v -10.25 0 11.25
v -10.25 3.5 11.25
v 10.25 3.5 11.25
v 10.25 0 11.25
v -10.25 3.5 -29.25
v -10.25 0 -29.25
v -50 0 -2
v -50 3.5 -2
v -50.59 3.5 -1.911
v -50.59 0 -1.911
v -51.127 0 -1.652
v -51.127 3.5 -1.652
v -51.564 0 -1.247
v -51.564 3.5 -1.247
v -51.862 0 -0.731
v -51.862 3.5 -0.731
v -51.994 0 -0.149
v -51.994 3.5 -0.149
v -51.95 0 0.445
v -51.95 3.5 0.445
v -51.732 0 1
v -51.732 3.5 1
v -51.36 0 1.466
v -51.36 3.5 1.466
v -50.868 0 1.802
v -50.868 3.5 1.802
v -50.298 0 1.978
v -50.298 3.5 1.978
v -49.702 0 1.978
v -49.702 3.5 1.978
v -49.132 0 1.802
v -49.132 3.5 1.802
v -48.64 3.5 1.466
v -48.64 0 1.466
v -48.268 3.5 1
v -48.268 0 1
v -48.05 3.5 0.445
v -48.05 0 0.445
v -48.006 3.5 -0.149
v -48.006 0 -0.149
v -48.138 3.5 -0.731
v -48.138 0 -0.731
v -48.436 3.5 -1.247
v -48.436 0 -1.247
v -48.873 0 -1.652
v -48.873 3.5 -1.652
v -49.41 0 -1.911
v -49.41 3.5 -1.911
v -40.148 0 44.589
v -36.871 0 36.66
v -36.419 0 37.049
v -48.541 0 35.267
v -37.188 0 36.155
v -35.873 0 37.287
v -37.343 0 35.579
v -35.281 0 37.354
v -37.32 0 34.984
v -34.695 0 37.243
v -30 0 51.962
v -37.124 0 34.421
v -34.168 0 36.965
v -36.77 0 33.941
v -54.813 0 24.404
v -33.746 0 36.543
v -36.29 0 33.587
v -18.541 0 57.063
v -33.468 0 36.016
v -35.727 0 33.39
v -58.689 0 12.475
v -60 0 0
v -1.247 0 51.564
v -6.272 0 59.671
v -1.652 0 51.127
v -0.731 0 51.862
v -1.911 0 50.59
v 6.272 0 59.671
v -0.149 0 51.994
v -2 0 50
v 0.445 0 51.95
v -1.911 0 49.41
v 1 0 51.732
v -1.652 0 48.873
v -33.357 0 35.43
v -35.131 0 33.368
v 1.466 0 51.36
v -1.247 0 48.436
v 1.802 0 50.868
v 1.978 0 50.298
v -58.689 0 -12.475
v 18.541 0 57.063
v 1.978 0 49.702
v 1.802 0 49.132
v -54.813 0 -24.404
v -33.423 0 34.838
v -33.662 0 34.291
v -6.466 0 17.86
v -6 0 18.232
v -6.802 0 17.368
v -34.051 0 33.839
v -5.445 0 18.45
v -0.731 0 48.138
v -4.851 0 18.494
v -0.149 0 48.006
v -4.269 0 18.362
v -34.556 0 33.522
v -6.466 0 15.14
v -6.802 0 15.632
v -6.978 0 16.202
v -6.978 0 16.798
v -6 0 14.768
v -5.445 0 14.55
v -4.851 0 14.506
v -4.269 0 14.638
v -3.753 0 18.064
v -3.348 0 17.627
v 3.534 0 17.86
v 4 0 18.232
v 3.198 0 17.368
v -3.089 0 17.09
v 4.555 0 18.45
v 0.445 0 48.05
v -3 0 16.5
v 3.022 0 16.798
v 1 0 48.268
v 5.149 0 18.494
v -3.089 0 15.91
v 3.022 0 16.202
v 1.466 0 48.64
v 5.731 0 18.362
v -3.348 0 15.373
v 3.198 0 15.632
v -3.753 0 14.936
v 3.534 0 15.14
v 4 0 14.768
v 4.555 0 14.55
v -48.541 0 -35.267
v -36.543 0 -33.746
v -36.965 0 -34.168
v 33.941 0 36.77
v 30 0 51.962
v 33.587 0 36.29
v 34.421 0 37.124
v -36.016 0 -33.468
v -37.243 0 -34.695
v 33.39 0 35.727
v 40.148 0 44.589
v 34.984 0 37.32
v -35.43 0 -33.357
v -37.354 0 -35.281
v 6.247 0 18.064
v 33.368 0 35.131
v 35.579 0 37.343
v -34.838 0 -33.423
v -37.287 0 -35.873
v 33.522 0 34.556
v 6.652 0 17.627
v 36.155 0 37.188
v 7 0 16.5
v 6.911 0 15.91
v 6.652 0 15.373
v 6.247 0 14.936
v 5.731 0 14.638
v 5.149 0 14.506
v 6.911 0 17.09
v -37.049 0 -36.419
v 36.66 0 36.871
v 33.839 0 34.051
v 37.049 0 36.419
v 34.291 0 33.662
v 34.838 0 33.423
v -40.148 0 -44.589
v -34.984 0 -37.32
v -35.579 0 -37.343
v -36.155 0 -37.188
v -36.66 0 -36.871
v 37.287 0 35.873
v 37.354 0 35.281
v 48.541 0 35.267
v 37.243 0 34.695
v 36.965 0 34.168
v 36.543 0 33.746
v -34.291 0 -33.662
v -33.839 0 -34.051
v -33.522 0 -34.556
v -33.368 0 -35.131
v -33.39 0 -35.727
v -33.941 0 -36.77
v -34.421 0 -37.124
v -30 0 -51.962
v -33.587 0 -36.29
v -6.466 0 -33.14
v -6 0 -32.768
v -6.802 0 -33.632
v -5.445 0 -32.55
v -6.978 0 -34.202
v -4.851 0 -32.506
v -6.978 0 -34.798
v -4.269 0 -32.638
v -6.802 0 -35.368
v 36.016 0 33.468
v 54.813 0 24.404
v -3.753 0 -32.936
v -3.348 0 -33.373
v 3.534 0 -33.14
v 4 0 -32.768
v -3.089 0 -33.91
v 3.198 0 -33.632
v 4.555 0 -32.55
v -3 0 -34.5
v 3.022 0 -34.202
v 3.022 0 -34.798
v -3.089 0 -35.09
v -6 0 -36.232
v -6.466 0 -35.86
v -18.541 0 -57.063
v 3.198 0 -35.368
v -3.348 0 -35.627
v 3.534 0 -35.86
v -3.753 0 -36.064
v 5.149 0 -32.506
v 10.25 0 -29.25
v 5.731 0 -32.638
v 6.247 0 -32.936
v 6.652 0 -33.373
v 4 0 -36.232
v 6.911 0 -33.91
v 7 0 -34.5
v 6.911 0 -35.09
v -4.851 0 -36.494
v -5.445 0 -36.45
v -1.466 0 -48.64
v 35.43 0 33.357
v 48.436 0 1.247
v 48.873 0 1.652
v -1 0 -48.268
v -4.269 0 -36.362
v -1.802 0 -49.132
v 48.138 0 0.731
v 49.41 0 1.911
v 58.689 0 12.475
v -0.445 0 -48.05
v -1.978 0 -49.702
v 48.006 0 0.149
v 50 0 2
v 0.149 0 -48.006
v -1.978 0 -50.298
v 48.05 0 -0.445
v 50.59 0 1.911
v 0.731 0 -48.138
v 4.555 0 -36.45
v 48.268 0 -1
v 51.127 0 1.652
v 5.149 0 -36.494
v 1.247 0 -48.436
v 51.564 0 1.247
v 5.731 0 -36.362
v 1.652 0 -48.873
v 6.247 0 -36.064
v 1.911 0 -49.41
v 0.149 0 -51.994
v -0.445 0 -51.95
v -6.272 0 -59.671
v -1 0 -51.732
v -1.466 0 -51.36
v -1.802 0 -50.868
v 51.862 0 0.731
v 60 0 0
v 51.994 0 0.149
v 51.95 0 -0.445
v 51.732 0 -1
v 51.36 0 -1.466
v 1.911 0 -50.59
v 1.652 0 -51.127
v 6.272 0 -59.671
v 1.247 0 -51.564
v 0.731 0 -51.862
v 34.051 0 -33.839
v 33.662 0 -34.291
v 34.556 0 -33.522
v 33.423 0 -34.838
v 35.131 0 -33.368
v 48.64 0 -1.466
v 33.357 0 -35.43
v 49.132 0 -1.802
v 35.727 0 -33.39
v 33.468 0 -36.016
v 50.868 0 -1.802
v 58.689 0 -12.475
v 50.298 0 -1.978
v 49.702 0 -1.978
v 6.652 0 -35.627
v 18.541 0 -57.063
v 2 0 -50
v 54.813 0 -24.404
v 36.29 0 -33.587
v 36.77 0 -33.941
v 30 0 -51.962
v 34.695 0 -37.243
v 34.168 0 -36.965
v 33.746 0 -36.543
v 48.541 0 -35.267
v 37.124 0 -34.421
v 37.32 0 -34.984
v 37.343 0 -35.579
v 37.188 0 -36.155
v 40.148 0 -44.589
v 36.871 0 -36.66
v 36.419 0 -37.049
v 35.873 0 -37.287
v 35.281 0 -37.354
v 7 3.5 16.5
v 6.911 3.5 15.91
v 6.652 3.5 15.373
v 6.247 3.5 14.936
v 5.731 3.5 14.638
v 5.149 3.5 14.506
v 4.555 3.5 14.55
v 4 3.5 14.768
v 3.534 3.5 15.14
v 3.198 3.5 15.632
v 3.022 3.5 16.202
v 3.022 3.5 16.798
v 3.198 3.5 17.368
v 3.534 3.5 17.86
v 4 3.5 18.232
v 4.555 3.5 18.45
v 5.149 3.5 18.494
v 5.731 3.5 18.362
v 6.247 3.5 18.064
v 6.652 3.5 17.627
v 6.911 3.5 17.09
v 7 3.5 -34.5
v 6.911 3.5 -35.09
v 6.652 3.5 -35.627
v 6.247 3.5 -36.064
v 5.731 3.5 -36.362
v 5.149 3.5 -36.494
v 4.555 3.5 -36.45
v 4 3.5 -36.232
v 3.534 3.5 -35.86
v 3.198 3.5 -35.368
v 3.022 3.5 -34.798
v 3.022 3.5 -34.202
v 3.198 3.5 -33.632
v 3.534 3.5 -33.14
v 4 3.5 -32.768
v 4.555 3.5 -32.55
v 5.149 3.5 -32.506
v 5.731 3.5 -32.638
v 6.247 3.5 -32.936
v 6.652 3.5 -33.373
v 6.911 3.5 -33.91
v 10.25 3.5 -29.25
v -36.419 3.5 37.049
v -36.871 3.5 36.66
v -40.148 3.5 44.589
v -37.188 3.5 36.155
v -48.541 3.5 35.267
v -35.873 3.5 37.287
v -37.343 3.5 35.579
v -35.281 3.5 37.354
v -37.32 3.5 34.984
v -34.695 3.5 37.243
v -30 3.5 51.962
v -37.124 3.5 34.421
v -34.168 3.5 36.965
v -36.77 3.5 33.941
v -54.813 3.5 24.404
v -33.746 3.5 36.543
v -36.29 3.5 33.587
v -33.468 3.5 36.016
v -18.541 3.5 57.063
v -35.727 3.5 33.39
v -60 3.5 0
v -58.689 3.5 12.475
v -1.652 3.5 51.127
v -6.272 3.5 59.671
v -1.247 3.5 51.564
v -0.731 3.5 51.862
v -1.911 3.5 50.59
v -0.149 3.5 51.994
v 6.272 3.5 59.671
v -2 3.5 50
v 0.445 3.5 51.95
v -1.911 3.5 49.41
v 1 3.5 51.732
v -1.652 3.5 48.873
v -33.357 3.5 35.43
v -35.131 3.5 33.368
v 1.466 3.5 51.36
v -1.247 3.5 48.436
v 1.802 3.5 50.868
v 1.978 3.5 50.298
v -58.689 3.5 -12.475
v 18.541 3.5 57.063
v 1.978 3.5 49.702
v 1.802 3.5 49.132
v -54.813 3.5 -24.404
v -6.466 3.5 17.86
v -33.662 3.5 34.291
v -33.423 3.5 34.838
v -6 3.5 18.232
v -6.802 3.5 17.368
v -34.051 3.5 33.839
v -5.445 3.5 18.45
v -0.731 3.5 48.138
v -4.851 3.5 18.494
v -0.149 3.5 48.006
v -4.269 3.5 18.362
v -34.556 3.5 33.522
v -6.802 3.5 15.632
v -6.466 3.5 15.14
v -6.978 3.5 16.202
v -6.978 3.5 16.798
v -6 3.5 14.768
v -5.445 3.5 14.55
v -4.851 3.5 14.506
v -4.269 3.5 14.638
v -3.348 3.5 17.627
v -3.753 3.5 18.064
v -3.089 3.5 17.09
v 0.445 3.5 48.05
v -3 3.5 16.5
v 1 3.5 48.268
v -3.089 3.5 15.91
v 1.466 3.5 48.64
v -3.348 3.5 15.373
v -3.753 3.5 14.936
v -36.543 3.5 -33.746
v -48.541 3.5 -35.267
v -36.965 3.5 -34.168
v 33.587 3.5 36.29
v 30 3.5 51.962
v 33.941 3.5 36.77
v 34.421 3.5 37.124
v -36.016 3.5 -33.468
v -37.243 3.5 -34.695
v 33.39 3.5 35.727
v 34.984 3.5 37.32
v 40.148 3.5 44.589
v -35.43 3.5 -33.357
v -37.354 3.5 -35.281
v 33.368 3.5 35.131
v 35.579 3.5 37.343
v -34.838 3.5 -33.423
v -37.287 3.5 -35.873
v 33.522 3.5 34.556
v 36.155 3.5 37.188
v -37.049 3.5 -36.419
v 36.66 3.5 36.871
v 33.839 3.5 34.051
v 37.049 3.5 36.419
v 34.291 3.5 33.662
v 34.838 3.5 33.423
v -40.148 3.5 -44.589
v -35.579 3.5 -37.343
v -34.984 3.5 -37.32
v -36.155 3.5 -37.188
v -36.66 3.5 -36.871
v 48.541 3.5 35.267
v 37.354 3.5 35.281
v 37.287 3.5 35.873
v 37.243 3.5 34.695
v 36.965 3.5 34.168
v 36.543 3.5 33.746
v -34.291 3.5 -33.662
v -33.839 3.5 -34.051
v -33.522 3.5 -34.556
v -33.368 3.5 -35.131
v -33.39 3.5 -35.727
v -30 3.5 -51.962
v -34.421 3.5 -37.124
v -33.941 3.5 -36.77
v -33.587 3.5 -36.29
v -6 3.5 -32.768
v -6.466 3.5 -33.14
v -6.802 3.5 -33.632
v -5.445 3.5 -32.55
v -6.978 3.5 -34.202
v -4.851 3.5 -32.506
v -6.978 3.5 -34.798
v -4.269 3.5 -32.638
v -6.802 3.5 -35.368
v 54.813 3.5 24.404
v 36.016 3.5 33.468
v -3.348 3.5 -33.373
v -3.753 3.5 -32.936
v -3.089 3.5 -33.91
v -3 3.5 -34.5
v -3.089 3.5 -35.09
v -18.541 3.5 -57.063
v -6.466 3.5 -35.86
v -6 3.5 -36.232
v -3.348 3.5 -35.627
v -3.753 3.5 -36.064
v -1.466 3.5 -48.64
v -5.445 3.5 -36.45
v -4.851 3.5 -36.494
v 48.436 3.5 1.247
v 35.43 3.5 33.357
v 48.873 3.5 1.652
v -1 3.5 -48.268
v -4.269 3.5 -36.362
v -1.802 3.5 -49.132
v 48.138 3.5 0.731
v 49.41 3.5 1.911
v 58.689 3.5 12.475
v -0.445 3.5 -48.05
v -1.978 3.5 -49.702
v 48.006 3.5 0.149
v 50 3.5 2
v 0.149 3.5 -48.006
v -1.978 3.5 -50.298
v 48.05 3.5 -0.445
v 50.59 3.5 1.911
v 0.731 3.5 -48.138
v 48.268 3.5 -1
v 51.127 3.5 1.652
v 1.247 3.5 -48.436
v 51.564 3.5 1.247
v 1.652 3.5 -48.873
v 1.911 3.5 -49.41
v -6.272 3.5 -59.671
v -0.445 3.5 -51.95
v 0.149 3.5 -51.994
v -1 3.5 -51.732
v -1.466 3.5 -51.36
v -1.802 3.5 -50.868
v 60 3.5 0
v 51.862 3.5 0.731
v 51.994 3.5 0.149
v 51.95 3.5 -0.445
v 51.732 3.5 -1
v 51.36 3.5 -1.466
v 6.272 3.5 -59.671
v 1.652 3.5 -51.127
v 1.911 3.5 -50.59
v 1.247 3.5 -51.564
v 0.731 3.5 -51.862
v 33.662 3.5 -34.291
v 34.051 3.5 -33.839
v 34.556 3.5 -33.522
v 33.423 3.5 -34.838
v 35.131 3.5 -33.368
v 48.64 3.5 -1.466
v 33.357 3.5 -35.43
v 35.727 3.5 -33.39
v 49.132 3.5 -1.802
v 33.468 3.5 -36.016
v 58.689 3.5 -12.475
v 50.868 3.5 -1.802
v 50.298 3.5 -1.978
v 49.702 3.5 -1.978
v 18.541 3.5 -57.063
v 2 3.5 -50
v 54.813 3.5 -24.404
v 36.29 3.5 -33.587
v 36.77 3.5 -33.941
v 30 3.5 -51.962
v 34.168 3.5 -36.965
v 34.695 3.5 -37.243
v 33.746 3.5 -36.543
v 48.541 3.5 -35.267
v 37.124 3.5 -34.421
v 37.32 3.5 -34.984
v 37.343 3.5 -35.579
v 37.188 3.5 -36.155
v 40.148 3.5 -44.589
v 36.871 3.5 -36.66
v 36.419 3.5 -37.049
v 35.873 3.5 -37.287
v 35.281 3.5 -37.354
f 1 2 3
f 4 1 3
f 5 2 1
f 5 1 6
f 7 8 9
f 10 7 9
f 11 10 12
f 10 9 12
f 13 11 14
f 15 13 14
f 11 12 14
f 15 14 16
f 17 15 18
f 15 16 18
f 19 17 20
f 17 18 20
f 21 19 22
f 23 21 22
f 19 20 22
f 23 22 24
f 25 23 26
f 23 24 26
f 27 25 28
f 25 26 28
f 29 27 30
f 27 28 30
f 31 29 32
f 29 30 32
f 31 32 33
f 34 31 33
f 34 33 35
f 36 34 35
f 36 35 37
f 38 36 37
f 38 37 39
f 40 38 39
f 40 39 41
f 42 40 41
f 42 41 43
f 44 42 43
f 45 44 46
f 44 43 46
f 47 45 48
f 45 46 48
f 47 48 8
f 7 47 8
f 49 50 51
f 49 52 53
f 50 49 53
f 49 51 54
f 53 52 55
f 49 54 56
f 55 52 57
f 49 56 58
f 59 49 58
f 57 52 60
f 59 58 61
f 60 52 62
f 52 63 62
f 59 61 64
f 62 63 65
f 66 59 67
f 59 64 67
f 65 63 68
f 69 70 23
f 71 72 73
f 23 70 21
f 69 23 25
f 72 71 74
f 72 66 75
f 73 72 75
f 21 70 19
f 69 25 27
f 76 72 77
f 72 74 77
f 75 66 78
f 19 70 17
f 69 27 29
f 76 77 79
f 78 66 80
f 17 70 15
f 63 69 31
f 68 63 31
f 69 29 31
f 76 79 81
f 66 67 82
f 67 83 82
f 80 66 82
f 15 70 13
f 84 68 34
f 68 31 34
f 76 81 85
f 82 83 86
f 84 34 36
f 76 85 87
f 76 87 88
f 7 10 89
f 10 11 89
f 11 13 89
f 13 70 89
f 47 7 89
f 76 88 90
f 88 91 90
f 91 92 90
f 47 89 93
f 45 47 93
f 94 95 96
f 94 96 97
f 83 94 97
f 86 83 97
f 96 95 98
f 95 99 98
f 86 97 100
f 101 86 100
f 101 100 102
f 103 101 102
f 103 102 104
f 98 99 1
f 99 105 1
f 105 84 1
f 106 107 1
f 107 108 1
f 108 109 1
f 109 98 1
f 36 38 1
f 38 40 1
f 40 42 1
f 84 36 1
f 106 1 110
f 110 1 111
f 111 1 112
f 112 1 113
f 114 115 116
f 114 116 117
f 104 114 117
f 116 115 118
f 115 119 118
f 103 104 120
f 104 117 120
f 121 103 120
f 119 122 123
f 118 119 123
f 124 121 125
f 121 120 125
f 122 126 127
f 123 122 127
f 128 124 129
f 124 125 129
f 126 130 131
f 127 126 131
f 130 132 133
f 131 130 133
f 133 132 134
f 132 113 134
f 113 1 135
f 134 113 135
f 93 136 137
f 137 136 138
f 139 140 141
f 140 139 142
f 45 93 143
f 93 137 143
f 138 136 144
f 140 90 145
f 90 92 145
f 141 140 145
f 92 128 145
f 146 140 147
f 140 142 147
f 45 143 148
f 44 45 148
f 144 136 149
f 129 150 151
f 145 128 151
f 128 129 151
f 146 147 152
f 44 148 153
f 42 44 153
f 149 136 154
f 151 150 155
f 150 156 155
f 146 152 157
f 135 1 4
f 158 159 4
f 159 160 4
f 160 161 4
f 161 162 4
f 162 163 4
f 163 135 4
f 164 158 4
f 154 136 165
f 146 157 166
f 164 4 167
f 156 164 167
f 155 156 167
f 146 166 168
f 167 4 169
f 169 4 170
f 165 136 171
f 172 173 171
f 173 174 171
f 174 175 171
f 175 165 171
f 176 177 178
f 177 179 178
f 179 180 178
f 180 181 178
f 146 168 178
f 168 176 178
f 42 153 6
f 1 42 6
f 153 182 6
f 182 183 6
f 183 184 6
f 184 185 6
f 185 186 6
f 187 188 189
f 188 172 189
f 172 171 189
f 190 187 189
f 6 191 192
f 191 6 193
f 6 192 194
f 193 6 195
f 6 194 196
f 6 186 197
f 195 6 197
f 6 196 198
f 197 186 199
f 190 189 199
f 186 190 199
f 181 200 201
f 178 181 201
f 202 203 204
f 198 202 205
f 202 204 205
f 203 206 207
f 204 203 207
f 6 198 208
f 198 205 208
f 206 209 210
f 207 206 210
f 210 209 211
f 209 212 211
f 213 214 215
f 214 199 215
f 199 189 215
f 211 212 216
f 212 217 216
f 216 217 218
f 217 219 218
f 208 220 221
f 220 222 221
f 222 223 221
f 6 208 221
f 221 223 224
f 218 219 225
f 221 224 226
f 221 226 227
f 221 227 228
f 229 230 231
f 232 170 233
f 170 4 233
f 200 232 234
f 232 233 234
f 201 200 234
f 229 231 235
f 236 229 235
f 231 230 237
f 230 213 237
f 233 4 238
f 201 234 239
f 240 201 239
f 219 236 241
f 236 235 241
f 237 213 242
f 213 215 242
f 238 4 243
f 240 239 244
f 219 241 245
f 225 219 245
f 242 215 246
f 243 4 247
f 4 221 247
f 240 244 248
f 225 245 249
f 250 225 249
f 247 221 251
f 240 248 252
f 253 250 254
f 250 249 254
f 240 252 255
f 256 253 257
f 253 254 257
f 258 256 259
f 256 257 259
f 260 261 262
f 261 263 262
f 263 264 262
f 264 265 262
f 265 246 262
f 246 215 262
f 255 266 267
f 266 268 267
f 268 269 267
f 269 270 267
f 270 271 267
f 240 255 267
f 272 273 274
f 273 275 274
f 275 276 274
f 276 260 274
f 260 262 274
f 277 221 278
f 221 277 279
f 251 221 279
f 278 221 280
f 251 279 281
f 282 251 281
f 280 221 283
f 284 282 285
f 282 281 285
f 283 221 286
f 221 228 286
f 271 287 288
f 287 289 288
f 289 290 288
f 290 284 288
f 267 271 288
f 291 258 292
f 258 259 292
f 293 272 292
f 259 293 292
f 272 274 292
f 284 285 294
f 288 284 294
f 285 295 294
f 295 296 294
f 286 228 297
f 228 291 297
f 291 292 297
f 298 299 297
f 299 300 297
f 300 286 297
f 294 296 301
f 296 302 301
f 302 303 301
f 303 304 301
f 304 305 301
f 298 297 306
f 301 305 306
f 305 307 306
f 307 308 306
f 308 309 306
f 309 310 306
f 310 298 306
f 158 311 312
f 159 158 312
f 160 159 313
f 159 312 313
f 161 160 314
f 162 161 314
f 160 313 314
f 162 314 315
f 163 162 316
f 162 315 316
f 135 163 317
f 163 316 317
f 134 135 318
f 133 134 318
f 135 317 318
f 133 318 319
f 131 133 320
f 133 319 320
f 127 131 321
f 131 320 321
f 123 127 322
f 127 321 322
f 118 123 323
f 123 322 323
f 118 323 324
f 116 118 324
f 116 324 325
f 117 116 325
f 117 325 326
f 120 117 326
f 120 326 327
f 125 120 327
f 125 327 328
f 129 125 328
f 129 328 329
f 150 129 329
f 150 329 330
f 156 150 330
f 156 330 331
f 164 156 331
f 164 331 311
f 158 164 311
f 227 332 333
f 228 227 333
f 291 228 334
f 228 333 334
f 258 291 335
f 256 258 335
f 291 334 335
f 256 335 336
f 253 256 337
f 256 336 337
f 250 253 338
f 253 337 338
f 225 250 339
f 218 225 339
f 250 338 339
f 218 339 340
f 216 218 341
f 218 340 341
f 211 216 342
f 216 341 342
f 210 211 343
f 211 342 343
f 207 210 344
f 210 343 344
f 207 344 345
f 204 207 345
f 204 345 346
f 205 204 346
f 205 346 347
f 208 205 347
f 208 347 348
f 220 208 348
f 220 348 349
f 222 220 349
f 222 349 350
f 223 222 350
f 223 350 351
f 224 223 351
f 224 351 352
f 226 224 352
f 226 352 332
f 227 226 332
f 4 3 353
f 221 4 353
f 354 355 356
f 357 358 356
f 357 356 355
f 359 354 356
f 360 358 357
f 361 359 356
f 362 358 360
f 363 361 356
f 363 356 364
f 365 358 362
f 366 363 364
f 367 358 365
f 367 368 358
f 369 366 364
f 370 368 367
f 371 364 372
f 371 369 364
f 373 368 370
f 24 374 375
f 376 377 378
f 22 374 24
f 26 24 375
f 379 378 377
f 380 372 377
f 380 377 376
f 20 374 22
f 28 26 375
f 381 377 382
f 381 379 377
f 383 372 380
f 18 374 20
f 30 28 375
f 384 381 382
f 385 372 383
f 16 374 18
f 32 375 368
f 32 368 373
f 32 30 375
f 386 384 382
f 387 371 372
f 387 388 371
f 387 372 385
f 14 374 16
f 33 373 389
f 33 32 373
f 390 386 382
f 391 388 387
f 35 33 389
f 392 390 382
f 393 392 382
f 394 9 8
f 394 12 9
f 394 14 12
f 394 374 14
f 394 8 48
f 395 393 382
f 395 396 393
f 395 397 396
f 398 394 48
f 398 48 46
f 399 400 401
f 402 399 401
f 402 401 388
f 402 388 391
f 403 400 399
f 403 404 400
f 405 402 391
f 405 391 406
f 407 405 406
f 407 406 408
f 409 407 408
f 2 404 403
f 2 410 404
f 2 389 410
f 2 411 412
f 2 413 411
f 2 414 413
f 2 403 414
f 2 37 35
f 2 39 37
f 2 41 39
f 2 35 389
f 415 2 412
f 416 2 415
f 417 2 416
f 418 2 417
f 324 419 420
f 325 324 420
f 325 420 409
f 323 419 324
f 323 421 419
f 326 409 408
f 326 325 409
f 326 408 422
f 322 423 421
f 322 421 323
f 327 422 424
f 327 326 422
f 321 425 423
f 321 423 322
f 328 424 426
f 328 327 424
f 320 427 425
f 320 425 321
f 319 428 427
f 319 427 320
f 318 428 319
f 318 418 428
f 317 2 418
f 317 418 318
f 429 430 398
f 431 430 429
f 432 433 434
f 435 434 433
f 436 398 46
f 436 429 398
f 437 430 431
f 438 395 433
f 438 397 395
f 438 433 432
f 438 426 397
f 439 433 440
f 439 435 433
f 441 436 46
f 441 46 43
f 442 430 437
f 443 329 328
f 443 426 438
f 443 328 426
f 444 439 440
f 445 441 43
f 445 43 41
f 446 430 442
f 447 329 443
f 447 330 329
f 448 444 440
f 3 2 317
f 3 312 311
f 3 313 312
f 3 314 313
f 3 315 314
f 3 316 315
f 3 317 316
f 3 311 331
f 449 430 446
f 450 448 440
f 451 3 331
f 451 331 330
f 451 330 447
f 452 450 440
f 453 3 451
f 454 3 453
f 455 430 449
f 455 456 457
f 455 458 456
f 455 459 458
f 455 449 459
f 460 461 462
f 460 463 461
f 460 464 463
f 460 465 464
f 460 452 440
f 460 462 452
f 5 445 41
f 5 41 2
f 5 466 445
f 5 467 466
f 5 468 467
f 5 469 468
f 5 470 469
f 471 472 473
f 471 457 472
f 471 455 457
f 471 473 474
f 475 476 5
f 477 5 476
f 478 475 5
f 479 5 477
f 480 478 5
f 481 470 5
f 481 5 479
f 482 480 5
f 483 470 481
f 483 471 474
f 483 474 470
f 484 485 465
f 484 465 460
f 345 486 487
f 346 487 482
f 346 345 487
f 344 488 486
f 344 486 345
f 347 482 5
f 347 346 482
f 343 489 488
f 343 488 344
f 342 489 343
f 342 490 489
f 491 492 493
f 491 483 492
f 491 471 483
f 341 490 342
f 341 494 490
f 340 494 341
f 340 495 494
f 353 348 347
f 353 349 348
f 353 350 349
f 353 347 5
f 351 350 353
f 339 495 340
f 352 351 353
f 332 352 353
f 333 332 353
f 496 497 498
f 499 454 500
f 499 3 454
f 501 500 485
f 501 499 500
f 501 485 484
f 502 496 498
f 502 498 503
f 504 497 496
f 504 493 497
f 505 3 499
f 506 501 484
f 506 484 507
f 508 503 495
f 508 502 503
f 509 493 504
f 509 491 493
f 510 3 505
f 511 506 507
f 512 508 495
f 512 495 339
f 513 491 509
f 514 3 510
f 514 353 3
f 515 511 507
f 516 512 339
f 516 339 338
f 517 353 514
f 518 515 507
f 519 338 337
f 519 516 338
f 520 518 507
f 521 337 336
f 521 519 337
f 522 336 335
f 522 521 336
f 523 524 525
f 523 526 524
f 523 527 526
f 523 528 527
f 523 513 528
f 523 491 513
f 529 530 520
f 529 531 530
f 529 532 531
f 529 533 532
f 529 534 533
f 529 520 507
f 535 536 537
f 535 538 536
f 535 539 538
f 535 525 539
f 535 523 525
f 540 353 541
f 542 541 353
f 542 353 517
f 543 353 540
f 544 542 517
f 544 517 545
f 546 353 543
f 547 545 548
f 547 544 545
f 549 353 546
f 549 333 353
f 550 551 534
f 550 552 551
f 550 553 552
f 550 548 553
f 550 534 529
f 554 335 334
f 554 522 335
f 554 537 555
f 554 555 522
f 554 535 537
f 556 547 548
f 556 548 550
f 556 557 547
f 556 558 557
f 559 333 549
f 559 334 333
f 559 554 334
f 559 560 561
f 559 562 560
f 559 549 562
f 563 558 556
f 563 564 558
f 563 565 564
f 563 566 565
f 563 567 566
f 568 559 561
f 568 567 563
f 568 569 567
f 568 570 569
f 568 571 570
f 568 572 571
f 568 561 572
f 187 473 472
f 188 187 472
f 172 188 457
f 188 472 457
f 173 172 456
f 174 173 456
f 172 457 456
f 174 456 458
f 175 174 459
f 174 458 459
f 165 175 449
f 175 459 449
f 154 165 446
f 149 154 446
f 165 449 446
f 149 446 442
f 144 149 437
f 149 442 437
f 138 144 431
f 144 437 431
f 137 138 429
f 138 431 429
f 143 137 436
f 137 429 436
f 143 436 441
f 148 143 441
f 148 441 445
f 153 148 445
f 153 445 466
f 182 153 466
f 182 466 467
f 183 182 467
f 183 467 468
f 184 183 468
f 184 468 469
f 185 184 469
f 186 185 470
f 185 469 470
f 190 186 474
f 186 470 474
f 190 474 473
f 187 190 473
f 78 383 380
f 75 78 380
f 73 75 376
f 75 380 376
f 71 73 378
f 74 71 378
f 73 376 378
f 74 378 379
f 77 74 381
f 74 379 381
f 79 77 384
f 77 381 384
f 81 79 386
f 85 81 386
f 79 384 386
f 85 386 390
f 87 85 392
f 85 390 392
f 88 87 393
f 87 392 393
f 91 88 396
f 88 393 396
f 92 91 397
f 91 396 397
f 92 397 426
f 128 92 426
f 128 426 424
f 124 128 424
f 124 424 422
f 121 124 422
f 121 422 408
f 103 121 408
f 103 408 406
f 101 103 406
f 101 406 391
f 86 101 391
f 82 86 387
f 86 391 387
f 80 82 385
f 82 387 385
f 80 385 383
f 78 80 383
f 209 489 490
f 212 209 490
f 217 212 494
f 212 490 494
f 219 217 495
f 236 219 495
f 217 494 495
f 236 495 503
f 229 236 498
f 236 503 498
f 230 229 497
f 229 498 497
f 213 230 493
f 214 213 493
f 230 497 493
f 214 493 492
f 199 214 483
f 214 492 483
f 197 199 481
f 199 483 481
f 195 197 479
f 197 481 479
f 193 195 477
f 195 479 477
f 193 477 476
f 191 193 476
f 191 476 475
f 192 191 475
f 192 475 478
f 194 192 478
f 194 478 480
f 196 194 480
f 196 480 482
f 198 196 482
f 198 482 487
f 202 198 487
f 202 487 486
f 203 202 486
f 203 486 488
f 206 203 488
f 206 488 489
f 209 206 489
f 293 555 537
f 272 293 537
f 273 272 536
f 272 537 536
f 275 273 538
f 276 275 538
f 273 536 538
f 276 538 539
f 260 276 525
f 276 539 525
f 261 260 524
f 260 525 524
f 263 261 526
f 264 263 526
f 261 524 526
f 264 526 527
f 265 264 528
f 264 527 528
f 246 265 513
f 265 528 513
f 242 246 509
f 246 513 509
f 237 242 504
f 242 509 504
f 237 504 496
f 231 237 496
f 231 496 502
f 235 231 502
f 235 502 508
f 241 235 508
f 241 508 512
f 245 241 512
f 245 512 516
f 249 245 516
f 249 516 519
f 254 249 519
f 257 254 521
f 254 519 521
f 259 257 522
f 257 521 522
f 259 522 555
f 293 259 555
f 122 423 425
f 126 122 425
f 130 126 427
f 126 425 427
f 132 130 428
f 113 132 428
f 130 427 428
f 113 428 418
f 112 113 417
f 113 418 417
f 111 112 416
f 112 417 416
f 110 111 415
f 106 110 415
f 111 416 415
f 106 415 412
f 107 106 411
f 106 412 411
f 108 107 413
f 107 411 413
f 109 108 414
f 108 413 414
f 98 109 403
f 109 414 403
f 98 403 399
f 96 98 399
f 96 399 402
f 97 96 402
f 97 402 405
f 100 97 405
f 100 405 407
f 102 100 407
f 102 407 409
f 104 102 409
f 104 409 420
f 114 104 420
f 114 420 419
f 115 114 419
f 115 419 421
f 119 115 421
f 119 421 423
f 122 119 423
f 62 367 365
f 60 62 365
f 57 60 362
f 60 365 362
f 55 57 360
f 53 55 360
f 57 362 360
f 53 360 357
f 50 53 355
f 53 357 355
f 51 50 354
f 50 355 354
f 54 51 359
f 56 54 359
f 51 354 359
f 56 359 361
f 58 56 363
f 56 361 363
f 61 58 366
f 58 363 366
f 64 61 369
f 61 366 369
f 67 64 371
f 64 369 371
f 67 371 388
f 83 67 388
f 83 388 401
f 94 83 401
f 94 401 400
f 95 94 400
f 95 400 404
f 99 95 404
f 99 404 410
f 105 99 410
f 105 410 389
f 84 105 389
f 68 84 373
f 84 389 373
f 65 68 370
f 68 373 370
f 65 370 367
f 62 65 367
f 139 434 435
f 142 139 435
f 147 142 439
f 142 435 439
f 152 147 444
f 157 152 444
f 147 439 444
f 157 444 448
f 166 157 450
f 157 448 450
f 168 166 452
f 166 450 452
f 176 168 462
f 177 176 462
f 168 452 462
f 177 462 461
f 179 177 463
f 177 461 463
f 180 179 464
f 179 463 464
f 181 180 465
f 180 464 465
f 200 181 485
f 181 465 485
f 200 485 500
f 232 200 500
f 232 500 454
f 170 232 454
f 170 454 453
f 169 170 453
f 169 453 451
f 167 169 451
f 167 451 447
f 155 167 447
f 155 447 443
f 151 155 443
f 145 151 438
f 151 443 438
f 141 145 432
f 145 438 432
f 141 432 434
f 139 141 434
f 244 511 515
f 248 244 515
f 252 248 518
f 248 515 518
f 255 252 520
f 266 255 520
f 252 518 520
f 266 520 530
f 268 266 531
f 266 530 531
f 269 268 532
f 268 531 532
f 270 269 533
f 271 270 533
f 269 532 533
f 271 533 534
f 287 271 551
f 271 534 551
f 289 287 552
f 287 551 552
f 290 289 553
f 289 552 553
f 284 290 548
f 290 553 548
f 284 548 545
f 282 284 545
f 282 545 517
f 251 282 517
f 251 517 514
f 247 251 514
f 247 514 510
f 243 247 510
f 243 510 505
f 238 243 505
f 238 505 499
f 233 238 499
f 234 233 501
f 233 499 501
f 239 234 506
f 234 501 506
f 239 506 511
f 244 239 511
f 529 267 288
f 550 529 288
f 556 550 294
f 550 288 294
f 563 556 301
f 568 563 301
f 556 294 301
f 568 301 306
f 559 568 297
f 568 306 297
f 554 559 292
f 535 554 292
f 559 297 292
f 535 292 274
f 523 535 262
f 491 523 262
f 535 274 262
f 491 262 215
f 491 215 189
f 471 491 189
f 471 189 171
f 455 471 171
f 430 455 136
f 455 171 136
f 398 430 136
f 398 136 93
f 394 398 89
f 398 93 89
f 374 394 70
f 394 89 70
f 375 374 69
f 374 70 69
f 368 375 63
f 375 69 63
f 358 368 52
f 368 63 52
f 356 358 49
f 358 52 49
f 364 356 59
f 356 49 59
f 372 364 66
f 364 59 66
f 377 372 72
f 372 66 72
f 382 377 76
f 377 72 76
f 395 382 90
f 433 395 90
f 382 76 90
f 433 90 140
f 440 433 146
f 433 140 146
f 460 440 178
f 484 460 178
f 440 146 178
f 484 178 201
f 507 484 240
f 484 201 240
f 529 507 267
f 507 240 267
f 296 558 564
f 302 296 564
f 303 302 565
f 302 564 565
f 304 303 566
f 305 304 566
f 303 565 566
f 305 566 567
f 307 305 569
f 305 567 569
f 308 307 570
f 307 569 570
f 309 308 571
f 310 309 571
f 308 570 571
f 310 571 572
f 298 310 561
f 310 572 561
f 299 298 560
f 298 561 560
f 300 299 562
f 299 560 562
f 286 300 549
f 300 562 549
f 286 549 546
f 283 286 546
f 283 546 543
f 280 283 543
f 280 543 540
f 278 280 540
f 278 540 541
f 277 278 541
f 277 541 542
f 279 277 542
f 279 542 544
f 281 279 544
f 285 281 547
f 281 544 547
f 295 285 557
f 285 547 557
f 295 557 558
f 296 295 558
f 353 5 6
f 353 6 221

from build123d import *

# Parameters (mm, degrees)
CROQUIS1_R              = 60
SALIENTE_EXTRUIR1_DEPTH = 3.5
CROQUIS2_R              = 2
CORTAR_EXTRUIR1_DEPTH   = 3.5
MATRIZC1_COUNT          = 8
CORTAR_EXTRUIR2_REACH   = 5.5
CROQUIS3_W              = 20.5
CROQUIS3_H              = 40.5
CORTAR_EXTRUIR4_REACH   = 5.5
CROQUIS5_R              = 2


with BuildPart() as part:
    # Croquis1 → Saliente-Extruir1 (new body)
    with BuildSketch(Plane(origin=(0, 0, 0), x_dir=(1, 0, 0), z_dir=(0, 1, 0))):
        Circle(CROQUIS1_R)
    extrude(amount=SALIENTE_EXTRUIR1_DEPTH)

    # Croquis2 → Cortar-Extruir1 (cut)
    with BuildSketch(Plane(origin=(0, 3.5, 0), x_dir=(1, 0, 0), z_dir=(0, 1, 0))):
        with Locations((0, 50)):
            Circle(CROQUIS2_R)
    cortar_extruir1 = extrude(amount=-CORTAR_EXTRUIR1_DEPTH, mode=Mode.SUBTRACT)

    # MatrizC1: Cortar-Extruir1 ×8 about axis
    matrizc1_axis = Axis((0, 0, 0), (0, 1, 0))
    for i in range(1, MATRIZC1_COUNT):
        add(cortar_extruir1.rotate(matrizc1_axis, i * 360 / MATRIZC1_COUNT), mode=Mode.SUBTRACT)

    # Croquis3 → Cortar-Extruir2 (cut, up to next)
    with BuildSketch(Plane(origin=(0, 3.5, 0), x_dir=(1, 0, 0), z_dir=(0, 1, 0)), mode=Mode.PRIVATE) as cortar_extruir2_sk1:
        with Locations((0, 9)):
            Rectangle(CROQUIS3_W, CROQUIS3_H)
    cortar_extruir2_tool1 = extrude(cortar_extruir2_sk1.sketch, amount=-CORTAR_EXTRUIR2_REACH, mode=Mode.PRIVATE) & part.part
    add(cortar_extruir2_tool1.solids().sort_by_distance((0, 3.5, -9))[0], mode=Mode.SUBTRACT)

    # Croquis5 → Cortar-Extruir4 (cut, up to next)
    with BuildSketch(Plane(origin=(0, 3.5, 0), x_dir=(1, 0, 0), z_dir=(0, 1, 0)), mode=Mode.PRIVATE) as cortar_extruir4_sk1:
        with Locations((5, 34.5)):
            Circle(CROQUIS5_R)
    cortar_extruir4_tool1 = extrude(cortar_extruir4_sk1.sketch, amount=-CORTAR_EXTRUIR4_REACH, mode=Mode.PRIVATE) & part.part
    add(cortar_extruir4_tool1.solids().sort_by_distance((5, 3.5, -34.5))[0], mode=Mode.SUBTRACT)
    # Croquis5 → Cortar-Extruir4 (cut, up to next)
    with BuildSketch(Plane(origin=(0, 3.5, 0), x_dir=(1, 0, 0), z_dir=(0, 1, 0)), mode=Mode.PRIVATE) as cortar_extruir4_sk2:
        with Locations((-5, 34.5)):
            Circle(CROQUIS5_R)
    cortar_extruir4_tool2 = extrude(cortar_extruir4_sk2.sketch, amount=-CORTAR_EXTRUIR4_REACH, mode=Mode.PRIVATE) & part.part
    add(cortar_extruir4_tool2.solids().sort_by_distance((-5, 3.5, -34.5))[0], mode=Mode.SUBTRACT)
    # Croquis5 → Cortar-Extruir4 (cut, up to next)
    with BuildSketch(Plane(origin=(0, 3.5, 0), x_dir=(1, 0, 0), z_dir=(0, 1, 0)), mode=Mode.PRIVATE) as cortar_extruir4_sk3:
        with Locations((-5, -16.5)):
            Circle(CROQUIS5_R)
    cortar_extruir4_tool3 = extrude(cortar_extruir4_sk3.sketch, amount=-CORTAR_EXTRUIR4_REACH, mode=Mode.PRIVATE) & part.part
    add(cortar_extruir4_tool3.solids().sort_by_distance((-5, 3.5, 16.5))[0], mode=Mode.SUBTRACT)
    # Croquis5 → Cortar-Extruir4 (cut, up to next)
    with BuildSketch(Plane(origin=(0, 3.5, 0), x_dir=(1, 0, 0), z_dir=(0, 1, 0)), mode=Mode.PRIVATE) as cortar_extruir4_sk4:
        with Locations((5, -16.5)):
            Circle(CROQUIS5_R)
    cortar_extruir4_tool4 = extrude(cortar_extruir4_sk4.sketch, amount=-CORTAR_EXTRUIR4_REACH, mode=Mode.PRIVATE) & part.part
    add(cortar_extruir4_tool4.solids().sort_by_distance((5, 3.5, 16.5))[0], mode=Mode.SUBTRACT)


solid = part.part
